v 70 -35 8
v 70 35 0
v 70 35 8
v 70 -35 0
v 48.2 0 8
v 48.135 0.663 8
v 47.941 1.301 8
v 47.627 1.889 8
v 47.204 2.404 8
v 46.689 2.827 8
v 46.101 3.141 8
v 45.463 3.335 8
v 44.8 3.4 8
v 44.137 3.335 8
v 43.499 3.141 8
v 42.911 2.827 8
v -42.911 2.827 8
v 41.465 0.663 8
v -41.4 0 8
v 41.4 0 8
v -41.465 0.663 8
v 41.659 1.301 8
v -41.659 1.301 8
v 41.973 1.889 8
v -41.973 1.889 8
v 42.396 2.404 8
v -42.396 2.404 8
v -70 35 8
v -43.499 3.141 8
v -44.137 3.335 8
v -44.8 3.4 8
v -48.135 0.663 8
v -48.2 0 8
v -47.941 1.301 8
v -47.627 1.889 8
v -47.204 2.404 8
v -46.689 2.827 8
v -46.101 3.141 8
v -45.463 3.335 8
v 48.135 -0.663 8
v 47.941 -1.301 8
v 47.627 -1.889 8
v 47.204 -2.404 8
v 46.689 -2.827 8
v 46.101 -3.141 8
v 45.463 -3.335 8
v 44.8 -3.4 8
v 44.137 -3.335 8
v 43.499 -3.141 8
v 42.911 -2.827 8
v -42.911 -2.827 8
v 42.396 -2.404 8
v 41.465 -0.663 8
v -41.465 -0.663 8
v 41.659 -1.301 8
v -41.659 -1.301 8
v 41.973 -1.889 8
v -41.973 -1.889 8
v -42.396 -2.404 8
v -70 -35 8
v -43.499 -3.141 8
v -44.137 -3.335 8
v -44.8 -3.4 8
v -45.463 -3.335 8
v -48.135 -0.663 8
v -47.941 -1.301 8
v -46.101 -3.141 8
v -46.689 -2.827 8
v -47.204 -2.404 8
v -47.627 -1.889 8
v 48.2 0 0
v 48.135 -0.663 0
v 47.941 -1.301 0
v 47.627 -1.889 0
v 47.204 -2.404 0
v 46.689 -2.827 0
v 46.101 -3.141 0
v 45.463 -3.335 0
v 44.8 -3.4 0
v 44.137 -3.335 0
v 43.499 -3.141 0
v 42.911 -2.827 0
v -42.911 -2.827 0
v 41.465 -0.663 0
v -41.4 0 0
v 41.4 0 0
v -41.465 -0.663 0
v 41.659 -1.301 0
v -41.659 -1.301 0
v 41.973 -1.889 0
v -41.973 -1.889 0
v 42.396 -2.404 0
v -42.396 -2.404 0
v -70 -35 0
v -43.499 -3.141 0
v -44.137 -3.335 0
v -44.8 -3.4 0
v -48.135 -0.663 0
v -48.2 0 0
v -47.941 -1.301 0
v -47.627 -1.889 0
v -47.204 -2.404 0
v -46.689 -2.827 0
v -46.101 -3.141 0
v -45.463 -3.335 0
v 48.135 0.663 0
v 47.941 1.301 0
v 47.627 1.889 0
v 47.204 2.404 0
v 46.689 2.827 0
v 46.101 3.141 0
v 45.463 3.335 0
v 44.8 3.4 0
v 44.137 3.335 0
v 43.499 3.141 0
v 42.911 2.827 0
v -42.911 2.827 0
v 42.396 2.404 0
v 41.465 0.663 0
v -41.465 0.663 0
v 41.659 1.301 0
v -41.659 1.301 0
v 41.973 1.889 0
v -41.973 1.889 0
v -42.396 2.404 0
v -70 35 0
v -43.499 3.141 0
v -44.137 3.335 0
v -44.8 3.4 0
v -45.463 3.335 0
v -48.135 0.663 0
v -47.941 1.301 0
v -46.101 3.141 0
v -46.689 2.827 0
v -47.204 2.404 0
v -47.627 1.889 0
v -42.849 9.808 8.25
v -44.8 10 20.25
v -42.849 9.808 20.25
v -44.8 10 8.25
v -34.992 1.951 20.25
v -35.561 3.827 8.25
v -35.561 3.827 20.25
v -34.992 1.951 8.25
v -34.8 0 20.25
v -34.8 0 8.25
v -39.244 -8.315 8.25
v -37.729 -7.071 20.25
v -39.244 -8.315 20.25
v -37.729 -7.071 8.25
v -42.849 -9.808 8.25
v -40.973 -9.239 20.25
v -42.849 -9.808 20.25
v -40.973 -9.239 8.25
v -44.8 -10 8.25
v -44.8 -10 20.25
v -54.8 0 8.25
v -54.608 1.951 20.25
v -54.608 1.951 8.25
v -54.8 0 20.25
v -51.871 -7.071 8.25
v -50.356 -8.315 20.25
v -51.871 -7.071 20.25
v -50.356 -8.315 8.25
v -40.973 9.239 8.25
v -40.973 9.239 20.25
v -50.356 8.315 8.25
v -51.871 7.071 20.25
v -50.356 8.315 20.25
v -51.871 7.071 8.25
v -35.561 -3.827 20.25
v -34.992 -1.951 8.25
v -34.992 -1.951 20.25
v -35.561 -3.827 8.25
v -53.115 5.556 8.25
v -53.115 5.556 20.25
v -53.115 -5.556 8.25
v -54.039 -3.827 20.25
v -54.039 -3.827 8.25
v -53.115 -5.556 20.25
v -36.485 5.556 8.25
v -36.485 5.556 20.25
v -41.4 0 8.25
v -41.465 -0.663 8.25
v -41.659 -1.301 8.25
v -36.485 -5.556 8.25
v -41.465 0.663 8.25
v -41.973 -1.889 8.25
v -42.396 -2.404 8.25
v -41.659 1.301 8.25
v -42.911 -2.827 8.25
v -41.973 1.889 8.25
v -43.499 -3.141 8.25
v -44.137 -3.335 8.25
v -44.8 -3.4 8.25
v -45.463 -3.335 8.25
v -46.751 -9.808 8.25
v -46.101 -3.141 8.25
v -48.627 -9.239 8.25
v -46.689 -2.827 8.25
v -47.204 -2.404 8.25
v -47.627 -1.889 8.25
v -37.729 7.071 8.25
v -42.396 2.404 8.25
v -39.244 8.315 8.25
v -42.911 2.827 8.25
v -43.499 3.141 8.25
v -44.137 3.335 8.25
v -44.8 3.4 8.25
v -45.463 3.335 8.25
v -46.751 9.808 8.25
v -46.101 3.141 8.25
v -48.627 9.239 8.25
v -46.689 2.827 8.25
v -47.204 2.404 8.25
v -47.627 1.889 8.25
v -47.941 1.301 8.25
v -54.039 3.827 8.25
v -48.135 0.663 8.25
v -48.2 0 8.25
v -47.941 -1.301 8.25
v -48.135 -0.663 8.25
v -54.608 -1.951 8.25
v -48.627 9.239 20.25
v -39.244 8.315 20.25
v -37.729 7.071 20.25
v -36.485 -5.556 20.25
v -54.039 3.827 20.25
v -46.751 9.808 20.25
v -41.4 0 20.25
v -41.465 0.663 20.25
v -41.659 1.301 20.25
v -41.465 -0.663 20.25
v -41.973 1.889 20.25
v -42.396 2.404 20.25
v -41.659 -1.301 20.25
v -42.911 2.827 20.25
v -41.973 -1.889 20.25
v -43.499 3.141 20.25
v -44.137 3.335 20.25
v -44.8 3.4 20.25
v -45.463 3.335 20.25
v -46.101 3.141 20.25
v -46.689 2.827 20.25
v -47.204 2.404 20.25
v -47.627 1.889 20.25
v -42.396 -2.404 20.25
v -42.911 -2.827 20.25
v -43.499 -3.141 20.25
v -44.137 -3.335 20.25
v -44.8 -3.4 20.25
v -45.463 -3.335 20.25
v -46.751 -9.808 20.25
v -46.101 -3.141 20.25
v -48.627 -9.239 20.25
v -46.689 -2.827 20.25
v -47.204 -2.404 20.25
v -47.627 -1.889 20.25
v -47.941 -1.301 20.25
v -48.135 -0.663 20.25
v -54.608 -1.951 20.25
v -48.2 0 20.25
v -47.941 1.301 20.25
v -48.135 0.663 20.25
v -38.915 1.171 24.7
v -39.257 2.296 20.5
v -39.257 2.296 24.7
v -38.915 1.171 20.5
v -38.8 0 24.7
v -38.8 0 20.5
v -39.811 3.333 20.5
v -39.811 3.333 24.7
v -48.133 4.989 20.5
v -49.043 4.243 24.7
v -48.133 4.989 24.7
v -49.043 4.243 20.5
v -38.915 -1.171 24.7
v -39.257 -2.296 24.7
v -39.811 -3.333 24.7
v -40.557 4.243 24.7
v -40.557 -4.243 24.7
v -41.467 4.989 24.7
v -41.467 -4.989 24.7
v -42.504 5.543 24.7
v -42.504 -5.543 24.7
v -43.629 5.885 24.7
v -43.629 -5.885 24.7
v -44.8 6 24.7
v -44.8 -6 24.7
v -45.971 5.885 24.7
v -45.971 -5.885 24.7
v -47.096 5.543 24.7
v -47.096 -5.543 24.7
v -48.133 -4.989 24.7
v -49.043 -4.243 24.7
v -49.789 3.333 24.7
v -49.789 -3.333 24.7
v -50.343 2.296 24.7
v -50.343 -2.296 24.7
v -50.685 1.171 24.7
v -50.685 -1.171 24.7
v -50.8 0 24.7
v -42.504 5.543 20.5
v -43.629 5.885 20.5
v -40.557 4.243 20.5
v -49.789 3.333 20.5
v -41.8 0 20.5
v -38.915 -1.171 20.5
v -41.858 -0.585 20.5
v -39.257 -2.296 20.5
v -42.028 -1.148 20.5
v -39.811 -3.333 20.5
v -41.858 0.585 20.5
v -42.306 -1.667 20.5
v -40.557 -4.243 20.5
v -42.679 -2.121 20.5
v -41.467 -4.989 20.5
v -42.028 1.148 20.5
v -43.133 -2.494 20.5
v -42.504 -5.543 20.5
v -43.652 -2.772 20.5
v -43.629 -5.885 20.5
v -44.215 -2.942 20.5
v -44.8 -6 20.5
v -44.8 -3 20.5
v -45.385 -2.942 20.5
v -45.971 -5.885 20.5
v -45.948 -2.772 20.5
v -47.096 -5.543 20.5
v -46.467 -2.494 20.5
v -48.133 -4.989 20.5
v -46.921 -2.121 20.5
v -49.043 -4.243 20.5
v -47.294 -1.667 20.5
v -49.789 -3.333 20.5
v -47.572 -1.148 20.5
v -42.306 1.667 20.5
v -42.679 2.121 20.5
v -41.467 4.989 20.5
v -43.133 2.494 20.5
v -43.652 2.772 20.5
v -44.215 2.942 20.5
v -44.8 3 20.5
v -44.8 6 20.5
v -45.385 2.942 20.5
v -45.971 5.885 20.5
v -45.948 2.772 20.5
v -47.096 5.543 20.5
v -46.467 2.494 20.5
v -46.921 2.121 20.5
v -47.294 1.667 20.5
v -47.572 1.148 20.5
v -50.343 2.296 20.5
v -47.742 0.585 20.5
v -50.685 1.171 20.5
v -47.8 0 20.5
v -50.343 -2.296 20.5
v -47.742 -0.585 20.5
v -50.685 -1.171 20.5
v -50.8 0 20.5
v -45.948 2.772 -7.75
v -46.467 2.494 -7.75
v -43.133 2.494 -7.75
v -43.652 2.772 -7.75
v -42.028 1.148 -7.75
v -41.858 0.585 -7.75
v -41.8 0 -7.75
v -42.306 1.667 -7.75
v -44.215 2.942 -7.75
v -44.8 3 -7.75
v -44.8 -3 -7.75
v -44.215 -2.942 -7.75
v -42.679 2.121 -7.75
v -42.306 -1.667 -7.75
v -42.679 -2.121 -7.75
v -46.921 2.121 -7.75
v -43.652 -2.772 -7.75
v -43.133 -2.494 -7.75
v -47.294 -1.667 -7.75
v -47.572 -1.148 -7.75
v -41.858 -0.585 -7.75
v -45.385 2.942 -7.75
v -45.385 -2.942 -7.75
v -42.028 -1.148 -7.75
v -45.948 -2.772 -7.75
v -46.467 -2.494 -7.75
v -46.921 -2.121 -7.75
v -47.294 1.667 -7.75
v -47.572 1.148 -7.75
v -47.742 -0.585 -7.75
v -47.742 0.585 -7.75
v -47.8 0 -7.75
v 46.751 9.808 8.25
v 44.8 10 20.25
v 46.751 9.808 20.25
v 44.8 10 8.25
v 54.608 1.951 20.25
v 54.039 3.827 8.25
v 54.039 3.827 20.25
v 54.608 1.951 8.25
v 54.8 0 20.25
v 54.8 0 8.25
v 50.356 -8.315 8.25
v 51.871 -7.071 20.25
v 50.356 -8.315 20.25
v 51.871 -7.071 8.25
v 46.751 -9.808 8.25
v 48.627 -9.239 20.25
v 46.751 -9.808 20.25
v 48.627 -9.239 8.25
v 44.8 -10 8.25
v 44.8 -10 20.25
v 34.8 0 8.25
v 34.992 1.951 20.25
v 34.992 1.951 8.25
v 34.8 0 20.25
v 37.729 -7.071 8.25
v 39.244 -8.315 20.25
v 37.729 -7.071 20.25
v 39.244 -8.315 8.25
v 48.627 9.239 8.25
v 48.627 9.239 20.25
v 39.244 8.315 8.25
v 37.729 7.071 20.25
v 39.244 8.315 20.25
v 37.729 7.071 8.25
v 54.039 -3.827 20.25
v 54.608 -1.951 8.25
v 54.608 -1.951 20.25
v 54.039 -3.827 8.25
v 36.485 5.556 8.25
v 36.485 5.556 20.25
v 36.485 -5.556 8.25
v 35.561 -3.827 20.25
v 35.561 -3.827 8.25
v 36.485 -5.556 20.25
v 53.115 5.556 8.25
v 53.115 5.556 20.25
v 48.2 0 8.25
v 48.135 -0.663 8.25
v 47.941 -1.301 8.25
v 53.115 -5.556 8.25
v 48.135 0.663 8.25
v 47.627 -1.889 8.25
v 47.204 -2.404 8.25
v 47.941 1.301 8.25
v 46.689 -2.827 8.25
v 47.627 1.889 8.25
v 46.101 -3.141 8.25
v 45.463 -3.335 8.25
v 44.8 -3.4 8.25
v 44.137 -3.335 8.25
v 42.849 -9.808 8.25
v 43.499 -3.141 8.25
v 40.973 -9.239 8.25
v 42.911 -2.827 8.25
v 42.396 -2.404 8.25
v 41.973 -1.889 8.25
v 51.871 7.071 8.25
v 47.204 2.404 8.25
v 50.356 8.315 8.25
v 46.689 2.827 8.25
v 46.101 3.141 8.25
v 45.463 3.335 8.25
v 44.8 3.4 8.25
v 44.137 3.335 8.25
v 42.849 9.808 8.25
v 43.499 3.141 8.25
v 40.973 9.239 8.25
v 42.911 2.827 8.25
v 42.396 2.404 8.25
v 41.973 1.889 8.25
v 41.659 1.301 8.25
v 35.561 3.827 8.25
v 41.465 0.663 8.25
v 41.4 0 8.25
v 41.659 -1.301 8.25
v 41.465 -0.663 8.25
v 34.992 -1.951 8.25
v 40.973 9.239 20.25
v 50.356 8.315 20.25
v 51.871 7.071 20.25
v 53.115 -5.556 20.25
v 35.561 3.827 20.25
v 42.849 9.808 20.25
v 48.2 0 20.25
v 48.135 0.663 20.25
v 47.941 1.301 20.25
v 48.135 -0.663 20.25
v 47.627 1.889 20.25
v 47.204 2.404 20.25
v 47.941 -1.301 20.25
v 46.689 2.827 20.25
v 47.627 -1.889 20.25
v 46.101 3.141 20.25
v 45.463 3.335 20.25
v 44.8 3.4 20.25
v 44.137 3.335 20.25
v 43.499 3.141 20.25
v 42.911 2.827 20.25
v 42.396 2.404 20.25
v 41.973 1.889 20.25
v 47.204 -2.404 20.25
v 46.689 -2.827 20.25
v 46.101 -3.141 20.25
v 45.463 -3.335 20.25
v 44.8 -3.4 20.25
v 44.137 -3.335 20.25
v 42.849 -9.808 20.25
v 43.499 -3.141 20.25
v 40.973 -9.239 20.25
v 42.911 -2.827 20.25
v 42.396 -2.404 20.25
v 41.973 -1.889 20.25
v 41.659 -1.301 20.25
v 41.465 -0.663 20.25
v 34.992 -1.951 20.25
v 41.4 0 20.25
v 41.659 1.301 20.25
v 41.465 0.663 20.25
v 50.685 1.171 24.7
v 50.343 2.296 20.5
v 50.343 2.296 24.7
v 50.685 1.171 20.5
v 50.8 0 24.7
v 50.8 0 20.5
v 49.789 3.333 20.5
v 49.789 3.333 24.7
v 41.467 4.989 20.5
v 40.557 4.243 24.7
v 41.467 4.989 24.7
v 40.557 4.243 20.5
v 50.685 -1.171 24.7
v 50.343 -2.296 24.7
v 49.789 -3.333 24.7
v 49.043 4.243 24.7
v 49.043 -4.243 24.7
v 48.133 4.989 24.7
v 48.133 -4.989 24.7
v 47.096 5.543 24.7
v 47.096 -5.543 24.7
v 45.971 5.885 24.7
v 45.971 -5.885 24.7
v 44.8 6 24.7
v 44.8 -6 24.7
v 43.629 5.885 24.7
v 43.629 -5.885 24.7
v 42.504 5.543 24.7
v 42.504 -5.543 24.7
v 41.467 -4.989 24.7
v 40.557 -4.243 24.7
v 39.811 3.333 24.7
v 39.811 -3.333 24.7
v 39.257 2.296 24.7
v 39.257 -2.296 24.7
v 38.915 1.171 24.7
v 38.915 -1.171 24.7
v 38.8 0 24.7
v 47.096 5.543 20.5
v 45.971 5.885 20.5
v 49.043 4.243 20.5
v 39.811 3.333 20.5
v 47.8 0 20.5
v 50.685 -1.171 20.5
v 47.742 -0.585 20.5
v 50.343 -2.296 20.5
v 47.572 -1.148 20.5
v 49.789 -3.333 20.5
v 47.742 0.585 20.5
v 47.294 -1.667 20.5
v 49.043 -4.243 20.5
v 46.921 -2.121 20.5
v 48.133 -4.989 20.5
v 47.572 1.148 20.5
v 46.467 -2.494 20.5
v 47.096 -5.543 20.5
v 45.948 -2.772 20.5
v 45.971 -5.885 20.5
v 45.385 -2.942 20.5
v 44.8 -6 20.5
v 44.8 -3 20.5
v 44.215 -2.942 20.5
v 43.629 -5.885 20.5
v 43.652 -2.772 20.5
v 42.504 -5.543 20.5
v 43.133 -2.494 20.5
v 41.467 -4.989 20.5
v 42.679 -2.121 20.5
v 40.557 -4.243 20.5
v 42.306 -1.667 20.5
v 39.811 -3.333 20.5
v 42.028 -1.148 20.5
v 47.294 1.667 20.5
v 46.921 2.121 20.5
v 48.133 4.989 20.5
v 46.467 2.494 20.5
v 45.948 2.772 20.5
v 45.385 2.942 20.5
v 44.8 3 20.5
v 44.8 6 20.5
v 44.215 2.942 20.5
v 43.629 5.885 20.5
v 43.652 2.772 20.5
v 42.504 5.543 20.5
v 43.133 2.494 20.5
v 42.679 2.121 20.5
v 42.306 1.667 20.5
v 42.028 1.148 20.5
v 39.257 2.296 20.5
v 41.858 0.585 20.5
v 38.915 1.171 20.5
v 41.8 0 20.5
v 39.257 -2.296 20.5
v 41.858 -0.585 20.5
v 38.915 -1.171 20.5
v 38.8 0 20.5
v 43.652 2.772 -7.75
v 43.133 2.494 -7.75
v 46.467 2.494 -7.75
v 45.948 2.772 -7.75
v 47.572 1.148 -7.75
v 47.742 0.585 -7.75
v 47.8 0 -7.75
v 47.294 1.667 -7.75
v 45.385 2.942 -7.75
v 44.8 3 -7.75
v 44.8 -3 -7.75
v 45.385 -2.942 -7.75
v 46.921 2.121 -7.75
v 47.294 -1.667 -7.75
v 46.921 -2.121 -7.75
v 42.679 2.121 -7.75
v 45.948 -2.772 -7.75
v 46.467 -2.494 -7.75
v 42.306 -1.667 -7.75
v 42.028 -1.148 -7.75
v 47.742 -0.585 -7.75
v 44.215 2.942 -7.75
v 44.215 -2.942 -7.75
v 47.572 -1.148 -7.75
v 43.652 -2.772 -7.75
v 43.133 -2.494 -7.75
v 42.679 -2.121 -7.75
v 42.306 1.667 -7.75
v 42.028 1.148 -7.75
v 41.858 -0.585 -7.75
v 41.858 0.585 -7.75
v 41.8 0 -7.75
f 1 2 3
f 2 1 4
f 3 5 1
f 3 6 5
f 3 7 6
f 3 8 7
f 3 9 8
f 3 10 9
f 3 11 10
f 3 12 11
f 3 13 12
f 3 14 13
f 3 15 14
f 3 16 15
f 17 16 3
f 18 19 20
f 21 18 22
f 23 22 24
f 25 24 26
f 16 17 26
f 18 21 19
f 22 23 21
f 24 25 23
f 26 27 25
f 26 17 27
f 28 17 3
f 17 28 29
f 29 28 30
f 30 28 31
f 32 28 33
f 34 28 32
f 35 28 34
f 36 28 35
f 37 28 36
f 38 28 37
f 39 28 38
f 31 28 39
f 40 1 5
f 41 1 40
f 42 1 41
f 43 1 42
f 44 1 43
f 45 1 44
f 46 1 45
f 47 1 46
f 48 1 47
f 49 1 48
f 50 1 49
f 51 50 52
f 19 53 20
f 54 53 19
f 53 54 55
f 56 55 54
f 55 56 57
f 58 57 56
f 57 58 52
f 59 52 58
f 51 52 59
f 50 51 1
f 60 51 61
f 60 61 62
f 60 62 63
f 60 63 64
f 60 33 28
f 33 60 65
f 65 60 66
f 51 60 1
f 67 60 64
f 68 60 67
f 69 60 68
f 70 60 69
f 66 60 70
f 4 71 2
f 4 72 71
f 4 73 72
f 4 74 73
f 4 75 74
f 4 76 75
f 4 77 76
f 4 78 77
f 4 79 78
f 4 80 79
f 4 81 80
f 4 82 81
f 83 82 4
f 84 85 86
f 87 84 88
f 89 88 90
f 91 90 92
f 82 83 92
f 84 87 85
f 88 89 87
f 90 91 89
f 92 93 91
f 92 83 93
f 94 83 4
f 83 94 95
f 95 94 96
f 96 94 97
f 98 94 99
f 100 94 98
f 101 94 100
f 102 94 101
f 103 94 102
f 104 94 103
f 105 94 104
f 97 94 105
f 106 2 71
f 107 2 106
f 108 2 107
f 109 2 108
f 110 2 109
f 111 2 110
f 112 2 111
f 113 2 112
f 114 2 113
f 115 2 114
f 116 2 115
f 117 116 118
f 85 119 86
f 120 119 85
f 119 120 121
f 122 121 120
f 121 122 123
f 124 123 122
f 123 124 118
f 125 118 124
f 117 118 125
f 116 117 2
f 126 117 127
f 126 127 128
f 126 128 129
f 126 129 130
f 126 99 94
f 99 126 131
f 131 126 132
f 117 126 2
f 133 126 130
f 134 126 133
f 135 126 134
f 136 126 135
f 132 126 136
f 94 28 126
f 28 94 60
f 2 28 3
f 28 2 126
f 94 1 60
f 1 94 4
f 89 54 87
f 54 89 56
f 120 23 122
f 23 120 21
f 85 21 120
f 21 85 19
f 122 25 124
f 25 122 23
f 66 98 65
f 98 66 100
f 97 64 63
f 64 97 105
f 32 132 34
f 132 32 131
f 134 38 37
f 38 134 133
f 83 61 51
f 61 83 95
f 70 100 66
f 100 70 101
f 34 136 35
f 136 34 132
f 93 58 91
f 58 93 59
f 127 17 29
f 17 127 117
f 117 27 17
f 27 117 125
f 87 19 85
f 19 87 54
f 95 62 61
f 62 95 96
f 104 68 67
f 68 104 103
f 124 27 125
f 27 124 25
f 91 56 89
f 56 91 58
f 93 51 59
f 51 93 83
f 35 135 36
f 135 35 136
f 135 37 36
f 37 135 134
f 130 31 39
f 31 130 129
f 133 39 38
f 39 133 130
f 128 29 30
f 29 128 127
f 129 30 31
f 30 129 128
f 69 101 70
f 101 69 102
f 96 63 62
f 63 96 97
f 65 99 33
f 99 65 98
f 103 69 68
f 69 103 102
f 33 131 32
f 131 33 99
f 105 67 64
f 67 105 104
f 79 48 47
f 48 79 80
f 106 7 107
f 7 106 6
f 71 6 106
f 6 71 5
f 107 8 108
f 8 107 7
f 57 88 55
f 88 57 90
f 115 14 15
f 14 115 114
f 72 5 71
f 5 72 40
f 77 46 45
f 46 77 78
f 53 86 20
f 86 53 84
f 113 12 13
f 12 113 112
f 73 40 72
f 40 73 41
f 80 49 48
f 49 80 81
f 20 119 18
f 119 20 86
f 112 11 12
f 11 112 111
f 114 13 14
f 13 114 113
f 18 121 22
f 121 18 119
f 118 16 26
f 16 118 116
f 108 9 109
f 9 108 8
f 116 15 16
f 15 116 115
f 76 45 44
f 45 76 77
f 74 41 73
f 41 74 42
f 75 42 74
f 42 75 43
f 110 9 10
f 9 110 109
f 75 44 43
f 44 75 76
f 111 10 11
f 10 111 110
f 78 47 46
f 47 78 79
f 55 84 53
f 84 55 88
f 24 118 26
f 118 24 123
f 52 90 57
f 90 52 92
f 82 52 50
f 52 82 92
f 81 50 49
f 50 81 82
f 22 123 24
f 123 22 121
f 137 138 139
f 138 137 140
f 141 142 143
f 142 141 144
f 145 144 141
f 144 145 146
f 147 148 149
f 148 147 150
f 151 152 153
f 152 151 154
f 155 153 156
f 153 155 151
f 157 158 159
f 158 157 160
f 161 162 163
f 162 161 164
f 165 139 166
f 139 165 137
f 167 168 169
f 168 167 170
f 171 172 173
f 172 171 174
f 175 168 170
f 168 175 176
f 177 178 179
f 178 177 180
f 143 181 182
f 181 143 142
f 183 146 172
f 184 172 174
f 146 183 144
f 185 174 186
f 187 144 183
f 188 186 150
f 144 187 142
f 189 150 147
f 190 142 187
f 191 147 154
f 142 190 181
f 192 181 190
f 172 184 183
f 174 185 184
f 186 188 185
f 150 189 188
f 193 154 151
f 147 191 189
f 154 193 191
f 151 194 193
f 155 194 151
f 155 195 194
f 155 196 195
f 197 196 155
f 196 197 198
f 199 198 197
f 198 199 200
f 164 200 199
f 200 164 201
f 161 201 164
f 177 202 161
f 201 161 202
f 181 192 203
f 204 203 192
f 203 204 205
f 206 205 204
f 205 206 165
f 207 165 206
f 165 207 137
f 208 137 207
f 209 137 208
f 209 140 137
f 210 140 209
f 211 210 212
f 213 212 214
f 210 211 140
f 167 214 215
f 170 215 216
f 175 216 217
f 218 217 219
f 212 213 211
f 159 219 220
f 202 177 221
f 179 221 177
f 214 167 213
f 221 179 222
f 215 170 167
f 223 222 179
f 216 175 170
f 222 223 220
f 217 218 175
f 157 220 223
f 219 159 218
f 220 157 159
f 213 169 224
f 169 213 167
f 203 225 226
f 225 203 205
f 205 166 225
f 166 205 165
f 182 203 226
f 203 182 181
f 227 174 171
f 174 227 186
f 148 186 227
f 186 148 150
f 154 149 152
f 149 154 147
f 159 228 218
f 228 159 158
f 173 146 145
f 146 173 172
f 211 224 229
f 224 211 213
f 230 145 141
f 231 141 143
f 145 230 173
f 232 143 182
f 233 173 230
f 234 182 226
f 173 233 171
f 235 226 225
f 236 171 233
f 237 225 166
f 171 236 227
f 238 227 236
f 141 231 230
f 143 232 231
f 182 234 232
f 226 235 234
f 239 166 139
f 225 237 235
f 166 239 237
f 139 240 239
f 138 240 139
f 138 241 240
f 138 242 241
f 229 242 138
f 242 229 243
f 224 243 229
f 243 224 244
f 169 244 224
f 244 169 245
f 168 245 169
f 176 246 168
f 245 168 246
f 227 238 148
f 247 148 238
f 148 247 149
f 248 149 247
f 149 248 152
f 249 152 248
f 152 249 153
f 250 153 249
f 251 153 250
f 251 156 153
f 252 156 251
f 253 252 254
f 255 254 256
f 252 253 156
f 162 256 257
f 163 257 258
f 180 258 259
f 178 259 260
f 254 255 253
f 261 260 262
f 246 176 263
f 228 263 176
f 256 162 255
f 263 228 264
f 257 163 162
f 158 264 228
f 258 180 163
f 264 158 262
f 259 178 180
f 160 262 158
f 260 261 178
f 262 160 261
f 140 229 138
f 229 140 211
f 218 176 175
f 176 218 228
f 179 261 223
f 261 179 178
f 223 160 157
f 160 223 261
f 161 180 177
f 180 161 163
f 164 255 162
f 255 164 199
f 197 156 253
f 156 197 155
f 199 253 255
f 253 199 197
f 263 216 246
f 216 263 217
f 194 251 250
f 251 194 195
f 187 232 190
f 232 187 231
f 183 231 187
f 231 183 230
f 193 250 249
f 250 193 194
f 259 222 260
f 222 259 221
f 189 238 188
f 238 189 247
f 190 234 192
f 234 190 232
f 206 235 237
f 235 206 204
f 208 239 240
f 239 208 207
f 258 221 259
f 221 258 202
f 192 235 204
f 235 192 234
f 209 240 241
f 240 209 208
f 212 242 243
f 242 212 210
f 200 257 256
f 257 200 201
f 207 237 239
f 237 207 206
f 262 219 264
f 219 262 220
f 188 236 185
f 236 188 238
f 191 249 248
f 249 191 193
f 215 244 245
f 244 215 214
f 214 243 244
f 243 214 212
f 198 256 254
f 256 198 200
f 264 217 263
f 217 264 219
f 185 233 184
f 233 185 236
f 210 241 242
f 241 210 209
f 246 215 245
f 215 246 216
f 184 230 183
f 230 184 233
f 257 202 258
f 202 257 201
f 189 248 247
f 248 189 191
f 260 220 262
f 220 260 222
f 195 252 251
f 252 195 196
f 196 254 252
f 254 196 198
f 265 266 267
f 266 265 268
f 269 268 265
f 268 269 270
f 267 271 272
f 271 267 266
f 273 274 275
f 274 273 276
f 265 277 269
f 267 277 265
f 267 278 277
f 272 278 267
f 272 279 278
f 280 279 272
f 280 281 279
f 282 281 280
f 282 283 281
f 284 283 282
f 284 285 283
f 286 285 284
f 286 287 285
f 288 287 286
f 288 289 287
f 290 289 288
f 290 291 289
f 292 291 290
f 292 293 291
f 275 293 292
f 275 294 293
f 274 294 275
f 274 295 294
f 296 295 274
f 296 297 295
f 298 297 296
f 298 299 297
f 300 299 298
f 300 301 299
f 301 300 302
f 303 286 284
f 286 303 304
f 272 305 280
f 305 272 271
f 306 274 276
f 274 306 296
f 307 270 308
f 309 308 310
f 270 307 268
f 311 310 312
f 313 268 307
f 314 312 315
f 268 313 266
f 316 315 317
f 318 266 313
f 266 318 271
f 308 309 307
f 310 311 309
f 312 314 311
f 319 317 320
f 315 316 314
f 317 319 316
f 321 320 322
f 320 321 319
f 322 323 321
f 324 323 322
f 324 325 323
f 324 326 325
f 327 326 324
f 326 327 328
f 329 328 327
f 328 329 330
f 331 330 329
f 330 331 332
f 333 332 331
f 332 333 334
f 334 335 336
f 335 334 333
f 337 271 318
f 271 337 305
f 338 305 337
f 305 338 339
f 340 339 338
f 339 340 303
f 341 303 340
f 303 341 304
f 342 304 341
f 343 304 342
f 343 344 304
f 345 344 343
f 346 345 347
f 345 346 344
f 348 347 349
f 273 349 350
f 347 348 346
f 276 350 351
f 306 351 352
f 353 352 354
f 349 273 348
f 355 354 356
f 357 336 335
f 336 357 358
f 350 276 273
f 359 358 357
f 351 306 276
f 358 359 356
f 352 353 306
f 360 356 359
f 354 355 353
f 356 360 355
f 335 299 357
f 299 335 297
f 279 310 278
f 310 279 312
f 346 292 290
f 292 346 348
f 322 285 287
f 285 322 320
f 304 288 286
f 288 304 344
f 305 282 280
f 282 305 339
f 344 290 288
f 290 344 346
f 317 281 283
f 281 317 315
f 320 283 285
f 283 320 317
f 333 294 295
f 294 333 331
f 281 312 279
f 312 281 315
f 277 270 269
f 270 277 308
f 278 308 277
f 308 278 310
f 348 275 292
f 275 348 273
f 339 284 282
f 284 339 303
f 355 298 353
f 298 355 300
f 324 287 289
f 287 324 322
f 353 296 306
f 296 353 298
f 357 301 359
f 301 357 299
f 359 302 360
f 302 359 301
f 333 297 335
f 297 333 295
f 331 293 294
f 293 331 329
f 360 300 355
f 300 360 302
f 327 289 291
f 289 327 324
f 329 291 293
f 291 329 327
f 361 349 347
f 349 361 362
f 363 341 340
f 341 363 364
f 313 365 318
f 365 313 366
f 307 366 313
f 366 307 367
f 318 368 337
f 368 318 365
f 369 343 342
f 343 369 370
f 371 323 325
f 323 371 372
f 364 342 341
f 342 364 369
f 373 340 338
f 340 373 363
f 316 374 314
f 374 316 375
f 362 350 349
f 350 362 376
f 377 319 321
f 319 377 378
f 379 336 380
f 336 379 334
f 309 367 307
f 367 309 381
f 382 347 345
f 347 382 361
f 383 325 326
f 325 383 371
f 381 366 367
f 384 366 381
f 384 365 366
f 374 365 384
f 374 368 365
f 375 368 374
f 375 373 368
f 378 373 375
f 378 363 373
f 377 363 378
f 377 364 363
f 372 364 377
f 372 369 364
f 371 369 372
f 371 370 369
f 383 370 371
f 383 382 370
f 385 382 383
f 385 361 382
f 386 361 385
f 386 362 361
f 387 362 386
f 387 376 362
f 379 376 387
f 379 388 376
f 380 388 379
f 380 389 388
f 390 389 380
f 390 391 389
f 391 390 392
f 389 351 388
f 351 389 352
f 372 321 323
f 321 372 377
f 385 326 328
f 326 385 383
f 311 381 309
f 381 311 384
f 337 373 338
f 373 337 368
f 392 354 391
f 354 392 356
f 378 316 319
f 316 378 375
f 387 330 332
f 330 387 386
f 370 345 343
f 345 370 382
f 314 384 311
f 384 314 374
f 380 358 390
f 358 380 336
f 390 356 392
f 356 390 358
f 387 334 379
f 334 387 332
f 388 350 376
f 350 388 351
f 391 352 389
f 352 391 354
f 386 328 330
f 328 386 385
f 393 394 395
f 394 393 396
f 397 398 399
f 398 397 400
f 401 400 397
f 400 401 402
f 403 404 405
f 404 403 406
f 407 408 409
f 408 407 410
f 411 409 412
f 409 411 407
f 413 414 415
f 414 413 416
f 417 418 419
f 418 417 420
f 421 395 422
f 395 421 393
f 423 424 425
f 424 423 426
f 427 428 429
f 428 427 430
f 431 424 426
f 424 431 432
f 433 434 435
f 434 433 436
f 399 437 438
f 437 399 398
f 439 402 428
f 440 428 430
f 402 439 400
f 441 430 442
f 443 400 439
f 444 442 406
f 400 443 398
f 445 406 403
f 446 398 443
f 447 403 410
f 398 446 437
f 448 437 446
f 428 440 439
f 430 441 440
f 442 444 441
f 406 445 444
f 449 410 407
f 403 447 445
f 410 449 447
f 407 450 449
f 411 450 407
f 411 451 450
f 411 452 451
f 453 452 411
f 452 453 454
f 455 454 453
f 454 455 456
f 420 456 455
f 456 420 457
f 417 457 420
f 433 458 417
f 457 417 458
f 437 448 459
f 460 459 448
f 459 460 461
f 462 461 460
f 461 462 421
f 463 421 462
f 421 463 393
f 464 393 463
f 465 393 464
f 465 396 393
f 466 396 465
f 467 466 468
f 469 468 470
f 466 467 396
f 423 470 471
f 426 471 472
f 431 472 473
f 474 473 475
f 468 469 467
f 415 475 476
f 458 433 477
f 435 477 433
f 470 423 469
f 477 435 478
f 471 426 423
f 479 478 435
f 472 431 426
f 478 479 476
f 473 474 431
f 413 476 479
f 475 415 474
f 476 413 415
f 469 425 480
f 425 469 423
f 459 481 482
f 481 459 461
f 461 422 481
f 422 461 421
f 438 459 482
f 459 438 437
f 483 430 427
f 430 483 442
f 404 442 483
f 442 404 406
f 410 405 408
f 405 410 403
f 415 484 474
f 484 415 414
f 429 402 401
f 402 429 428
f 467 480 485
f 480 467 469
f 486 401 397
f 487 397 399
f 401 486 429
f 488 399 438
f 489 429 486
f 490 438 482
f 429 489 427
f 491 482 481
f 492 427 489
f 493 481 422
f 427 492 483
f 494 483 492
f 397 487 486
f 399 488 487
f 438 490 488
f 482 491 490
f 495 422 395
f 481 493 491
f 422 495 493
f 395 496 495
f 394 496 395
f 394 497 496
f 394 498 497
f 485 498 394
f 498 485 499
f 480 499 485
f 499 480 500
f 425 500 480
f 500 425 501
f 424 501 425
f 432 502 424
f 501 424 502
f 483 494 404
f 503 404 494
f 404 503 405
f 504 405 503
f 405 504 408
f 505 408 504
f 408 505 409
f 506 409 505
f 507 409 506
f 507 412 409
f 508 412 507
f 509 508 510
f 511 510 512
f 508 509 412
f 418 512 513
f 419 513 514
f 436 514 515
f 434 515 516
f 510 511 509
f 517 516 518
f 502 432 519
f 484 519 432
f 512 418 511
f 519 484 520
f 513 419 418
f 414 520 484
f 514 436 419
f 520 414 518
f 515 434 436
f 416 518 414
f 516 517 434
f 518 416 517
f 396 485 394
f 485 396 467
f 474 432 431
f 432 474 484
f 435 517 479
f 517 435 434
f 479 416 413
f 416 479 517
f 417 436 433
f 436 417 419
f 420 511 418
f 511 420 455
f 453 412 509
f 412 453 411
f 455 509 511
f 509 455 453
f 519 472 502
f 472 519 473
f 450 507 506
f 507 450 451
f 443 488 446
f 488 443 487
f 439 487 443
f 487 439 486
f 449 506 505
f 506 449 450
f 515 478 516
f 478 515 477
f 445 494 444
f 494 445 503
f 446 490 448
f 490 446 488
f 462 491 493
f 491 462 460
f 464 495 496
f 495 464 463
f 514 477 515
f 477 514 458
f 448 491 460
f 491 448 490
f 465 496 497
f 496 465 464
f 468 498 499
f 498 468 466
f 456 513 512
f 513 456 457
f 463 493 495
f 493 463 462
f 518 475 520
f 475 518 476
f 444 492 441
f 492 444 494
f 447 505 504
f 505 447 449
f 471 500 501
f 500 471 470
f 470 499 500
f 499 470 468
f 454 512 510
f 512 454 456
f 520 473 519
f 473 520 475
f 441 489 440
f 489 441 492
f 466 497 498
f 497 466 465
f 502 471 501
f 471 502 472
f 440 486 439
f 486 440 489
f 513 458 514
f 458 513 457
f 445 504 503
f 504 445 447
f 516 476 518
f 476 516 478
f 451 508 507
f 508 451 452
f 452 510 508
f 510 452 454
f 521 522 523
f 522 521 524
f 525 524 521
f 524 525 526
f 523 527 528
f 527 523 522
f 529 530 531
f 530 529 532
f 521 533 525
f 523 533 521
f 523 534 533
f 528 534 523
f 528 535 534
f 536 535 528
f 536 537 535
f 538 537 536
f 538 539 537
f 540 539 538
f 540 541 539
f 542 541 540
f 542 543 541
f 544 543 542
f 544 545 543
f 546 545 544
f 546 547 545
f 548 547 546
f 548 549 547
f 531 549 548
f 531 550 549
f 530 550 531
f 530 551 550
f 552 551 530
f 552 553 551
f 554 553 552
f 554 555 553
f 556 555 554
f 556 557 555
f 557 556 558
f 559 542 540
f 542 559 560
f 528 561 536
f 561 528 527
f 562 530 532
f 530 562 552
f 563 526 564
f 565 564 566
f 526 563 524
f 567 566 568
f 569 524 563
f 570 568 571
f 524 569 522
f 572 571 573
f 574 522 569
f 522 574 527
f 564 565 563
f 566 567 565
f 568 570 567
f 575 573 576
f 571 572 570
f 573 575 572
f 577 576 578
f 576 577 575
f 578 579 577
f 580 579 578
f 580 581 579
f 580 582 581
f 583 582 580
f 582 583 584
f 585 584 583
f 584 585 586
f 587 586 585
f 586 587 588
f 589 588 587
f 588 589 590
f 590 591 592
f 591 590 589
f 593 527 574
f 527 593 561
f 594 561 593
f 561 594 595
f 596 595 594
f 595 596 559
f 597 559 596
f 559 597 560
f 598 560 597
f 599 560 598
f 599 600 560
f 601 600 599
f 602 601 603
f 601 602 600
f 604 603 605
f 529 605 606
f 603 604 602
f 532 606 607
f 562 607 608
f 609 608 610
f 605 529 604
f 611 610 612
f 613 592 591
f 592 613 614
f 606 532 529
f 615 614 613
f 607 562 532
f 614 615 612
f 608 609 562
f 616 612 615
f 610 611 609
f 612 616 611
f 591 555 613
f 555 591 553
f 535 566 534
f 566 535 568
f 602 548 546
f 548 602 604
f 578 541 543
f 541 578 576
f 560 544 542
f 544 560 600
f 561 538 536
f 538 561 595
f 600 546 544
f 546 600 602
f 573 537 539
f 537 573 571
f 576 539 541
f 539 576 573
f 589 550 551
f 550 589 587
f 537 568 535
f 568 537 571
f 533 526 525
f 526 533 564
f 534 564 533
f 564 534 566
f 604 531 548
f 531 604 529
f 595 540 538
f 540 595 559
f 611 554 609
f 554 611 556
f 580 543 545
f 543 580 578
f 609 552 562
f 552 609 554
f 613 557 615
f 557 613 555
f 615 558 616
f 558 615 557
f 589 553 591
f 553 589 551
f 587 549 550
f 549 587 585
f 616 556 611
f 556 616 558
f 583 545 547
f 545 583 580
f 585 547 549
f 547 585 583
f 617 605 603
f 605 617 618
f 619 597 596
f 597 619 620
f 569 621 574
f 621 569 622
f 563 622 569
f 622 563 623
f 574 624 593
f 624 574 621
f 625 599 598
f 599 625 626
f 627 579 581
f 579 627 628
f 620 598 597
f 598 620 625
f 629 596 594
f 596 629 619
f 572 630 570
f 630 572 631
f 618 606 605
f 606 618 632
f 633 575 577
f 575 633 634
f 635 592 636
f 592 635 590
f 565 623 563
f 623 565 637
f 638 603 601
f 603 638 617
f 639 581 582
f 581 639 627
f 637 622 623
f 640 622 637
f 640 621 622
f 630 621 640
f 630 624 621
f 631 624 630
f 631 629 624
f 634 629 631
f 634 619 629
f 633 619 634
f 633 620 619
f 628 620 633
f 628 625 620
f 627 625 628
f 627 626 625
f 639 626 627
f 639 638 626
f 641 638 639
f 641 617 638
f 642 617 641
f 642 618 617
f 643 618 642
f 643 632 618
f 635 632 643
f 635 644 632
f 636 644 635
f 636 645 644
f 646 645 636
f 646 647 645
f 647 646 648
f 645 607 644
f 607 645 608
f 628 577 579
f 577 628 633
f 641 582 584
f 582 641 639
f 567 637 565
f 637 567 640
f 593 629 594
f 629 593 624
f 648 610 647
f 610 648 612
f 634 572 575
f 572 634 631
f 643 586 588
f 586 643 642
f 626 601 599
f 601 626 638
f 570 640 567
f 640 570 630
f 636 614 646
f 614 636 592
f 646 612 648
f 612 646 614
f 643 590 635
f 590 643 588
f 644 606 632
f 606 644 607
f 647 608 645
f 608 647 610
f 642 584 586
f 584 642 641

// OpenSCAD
$fn = 32;

// ------------------------------------------------------------------------
// Standoff columns: 2 d20 standoffs, bolts d6
// Every part is its own module, assembly() places them once.
// ------------------------------------------------------------------------

// --- part 1 ---
module base_plate() {
  difference() {
    translate([-70, -35, 0]) cube([140, 70, 8]);
    translate([-44.8, 0, -1]) cylinder(h = 10, d = 6.8);
    translate([44.8, 0, -1]) cylinder(h = 10, d = 6.8);
  }
}

// --- part 2 ---
module spacer1() {
  difference() {
      translate([0, 0, 0]) cylinder(h = 12, d = 20);
      translate([0, 0, -1]) cylinder(h = 14, d = 6.8);
    }
}

// --- part 3 ---
module bolt1() {
  cylinder(h = 4.2, d = 12);
  translate([0, 0, -28.25]) cylinder(h = 28.25, d = 6);
}

// --- part 4 ---
module spacer2() {
  difference() {
      translate([0, 0, 0]) cylinder(h = 12, d = 20);
      translate([0, 0, -1]) cylinder(h = 14, d = 6.8);
    }
}

// --- part 5 ---
module bolt2() {
  cylinder(h = 4.2, d = 12);
  translate([0, 0, -28.25]) cylinder(h = 28.25, d = 6);
}

// --- assembly ---
module assembly() {
  translate([0, 0, 0]) rotate([0, 0, 0]) base_plate();
  translate([-44.8, 0, 8.25]) rotate([0, 0, 0]) spacer1();
  translate([-44.8, 0, 20.5]) rotate([0, 0, 0]) bolt1();
  translate([44.8, 0, 8.25]) rotate([0, 0, 0]) spacer2();
  translate([44.8, 0, 20.5]) rotate([0, 0, 0]) bolt2();
}

assembly();
